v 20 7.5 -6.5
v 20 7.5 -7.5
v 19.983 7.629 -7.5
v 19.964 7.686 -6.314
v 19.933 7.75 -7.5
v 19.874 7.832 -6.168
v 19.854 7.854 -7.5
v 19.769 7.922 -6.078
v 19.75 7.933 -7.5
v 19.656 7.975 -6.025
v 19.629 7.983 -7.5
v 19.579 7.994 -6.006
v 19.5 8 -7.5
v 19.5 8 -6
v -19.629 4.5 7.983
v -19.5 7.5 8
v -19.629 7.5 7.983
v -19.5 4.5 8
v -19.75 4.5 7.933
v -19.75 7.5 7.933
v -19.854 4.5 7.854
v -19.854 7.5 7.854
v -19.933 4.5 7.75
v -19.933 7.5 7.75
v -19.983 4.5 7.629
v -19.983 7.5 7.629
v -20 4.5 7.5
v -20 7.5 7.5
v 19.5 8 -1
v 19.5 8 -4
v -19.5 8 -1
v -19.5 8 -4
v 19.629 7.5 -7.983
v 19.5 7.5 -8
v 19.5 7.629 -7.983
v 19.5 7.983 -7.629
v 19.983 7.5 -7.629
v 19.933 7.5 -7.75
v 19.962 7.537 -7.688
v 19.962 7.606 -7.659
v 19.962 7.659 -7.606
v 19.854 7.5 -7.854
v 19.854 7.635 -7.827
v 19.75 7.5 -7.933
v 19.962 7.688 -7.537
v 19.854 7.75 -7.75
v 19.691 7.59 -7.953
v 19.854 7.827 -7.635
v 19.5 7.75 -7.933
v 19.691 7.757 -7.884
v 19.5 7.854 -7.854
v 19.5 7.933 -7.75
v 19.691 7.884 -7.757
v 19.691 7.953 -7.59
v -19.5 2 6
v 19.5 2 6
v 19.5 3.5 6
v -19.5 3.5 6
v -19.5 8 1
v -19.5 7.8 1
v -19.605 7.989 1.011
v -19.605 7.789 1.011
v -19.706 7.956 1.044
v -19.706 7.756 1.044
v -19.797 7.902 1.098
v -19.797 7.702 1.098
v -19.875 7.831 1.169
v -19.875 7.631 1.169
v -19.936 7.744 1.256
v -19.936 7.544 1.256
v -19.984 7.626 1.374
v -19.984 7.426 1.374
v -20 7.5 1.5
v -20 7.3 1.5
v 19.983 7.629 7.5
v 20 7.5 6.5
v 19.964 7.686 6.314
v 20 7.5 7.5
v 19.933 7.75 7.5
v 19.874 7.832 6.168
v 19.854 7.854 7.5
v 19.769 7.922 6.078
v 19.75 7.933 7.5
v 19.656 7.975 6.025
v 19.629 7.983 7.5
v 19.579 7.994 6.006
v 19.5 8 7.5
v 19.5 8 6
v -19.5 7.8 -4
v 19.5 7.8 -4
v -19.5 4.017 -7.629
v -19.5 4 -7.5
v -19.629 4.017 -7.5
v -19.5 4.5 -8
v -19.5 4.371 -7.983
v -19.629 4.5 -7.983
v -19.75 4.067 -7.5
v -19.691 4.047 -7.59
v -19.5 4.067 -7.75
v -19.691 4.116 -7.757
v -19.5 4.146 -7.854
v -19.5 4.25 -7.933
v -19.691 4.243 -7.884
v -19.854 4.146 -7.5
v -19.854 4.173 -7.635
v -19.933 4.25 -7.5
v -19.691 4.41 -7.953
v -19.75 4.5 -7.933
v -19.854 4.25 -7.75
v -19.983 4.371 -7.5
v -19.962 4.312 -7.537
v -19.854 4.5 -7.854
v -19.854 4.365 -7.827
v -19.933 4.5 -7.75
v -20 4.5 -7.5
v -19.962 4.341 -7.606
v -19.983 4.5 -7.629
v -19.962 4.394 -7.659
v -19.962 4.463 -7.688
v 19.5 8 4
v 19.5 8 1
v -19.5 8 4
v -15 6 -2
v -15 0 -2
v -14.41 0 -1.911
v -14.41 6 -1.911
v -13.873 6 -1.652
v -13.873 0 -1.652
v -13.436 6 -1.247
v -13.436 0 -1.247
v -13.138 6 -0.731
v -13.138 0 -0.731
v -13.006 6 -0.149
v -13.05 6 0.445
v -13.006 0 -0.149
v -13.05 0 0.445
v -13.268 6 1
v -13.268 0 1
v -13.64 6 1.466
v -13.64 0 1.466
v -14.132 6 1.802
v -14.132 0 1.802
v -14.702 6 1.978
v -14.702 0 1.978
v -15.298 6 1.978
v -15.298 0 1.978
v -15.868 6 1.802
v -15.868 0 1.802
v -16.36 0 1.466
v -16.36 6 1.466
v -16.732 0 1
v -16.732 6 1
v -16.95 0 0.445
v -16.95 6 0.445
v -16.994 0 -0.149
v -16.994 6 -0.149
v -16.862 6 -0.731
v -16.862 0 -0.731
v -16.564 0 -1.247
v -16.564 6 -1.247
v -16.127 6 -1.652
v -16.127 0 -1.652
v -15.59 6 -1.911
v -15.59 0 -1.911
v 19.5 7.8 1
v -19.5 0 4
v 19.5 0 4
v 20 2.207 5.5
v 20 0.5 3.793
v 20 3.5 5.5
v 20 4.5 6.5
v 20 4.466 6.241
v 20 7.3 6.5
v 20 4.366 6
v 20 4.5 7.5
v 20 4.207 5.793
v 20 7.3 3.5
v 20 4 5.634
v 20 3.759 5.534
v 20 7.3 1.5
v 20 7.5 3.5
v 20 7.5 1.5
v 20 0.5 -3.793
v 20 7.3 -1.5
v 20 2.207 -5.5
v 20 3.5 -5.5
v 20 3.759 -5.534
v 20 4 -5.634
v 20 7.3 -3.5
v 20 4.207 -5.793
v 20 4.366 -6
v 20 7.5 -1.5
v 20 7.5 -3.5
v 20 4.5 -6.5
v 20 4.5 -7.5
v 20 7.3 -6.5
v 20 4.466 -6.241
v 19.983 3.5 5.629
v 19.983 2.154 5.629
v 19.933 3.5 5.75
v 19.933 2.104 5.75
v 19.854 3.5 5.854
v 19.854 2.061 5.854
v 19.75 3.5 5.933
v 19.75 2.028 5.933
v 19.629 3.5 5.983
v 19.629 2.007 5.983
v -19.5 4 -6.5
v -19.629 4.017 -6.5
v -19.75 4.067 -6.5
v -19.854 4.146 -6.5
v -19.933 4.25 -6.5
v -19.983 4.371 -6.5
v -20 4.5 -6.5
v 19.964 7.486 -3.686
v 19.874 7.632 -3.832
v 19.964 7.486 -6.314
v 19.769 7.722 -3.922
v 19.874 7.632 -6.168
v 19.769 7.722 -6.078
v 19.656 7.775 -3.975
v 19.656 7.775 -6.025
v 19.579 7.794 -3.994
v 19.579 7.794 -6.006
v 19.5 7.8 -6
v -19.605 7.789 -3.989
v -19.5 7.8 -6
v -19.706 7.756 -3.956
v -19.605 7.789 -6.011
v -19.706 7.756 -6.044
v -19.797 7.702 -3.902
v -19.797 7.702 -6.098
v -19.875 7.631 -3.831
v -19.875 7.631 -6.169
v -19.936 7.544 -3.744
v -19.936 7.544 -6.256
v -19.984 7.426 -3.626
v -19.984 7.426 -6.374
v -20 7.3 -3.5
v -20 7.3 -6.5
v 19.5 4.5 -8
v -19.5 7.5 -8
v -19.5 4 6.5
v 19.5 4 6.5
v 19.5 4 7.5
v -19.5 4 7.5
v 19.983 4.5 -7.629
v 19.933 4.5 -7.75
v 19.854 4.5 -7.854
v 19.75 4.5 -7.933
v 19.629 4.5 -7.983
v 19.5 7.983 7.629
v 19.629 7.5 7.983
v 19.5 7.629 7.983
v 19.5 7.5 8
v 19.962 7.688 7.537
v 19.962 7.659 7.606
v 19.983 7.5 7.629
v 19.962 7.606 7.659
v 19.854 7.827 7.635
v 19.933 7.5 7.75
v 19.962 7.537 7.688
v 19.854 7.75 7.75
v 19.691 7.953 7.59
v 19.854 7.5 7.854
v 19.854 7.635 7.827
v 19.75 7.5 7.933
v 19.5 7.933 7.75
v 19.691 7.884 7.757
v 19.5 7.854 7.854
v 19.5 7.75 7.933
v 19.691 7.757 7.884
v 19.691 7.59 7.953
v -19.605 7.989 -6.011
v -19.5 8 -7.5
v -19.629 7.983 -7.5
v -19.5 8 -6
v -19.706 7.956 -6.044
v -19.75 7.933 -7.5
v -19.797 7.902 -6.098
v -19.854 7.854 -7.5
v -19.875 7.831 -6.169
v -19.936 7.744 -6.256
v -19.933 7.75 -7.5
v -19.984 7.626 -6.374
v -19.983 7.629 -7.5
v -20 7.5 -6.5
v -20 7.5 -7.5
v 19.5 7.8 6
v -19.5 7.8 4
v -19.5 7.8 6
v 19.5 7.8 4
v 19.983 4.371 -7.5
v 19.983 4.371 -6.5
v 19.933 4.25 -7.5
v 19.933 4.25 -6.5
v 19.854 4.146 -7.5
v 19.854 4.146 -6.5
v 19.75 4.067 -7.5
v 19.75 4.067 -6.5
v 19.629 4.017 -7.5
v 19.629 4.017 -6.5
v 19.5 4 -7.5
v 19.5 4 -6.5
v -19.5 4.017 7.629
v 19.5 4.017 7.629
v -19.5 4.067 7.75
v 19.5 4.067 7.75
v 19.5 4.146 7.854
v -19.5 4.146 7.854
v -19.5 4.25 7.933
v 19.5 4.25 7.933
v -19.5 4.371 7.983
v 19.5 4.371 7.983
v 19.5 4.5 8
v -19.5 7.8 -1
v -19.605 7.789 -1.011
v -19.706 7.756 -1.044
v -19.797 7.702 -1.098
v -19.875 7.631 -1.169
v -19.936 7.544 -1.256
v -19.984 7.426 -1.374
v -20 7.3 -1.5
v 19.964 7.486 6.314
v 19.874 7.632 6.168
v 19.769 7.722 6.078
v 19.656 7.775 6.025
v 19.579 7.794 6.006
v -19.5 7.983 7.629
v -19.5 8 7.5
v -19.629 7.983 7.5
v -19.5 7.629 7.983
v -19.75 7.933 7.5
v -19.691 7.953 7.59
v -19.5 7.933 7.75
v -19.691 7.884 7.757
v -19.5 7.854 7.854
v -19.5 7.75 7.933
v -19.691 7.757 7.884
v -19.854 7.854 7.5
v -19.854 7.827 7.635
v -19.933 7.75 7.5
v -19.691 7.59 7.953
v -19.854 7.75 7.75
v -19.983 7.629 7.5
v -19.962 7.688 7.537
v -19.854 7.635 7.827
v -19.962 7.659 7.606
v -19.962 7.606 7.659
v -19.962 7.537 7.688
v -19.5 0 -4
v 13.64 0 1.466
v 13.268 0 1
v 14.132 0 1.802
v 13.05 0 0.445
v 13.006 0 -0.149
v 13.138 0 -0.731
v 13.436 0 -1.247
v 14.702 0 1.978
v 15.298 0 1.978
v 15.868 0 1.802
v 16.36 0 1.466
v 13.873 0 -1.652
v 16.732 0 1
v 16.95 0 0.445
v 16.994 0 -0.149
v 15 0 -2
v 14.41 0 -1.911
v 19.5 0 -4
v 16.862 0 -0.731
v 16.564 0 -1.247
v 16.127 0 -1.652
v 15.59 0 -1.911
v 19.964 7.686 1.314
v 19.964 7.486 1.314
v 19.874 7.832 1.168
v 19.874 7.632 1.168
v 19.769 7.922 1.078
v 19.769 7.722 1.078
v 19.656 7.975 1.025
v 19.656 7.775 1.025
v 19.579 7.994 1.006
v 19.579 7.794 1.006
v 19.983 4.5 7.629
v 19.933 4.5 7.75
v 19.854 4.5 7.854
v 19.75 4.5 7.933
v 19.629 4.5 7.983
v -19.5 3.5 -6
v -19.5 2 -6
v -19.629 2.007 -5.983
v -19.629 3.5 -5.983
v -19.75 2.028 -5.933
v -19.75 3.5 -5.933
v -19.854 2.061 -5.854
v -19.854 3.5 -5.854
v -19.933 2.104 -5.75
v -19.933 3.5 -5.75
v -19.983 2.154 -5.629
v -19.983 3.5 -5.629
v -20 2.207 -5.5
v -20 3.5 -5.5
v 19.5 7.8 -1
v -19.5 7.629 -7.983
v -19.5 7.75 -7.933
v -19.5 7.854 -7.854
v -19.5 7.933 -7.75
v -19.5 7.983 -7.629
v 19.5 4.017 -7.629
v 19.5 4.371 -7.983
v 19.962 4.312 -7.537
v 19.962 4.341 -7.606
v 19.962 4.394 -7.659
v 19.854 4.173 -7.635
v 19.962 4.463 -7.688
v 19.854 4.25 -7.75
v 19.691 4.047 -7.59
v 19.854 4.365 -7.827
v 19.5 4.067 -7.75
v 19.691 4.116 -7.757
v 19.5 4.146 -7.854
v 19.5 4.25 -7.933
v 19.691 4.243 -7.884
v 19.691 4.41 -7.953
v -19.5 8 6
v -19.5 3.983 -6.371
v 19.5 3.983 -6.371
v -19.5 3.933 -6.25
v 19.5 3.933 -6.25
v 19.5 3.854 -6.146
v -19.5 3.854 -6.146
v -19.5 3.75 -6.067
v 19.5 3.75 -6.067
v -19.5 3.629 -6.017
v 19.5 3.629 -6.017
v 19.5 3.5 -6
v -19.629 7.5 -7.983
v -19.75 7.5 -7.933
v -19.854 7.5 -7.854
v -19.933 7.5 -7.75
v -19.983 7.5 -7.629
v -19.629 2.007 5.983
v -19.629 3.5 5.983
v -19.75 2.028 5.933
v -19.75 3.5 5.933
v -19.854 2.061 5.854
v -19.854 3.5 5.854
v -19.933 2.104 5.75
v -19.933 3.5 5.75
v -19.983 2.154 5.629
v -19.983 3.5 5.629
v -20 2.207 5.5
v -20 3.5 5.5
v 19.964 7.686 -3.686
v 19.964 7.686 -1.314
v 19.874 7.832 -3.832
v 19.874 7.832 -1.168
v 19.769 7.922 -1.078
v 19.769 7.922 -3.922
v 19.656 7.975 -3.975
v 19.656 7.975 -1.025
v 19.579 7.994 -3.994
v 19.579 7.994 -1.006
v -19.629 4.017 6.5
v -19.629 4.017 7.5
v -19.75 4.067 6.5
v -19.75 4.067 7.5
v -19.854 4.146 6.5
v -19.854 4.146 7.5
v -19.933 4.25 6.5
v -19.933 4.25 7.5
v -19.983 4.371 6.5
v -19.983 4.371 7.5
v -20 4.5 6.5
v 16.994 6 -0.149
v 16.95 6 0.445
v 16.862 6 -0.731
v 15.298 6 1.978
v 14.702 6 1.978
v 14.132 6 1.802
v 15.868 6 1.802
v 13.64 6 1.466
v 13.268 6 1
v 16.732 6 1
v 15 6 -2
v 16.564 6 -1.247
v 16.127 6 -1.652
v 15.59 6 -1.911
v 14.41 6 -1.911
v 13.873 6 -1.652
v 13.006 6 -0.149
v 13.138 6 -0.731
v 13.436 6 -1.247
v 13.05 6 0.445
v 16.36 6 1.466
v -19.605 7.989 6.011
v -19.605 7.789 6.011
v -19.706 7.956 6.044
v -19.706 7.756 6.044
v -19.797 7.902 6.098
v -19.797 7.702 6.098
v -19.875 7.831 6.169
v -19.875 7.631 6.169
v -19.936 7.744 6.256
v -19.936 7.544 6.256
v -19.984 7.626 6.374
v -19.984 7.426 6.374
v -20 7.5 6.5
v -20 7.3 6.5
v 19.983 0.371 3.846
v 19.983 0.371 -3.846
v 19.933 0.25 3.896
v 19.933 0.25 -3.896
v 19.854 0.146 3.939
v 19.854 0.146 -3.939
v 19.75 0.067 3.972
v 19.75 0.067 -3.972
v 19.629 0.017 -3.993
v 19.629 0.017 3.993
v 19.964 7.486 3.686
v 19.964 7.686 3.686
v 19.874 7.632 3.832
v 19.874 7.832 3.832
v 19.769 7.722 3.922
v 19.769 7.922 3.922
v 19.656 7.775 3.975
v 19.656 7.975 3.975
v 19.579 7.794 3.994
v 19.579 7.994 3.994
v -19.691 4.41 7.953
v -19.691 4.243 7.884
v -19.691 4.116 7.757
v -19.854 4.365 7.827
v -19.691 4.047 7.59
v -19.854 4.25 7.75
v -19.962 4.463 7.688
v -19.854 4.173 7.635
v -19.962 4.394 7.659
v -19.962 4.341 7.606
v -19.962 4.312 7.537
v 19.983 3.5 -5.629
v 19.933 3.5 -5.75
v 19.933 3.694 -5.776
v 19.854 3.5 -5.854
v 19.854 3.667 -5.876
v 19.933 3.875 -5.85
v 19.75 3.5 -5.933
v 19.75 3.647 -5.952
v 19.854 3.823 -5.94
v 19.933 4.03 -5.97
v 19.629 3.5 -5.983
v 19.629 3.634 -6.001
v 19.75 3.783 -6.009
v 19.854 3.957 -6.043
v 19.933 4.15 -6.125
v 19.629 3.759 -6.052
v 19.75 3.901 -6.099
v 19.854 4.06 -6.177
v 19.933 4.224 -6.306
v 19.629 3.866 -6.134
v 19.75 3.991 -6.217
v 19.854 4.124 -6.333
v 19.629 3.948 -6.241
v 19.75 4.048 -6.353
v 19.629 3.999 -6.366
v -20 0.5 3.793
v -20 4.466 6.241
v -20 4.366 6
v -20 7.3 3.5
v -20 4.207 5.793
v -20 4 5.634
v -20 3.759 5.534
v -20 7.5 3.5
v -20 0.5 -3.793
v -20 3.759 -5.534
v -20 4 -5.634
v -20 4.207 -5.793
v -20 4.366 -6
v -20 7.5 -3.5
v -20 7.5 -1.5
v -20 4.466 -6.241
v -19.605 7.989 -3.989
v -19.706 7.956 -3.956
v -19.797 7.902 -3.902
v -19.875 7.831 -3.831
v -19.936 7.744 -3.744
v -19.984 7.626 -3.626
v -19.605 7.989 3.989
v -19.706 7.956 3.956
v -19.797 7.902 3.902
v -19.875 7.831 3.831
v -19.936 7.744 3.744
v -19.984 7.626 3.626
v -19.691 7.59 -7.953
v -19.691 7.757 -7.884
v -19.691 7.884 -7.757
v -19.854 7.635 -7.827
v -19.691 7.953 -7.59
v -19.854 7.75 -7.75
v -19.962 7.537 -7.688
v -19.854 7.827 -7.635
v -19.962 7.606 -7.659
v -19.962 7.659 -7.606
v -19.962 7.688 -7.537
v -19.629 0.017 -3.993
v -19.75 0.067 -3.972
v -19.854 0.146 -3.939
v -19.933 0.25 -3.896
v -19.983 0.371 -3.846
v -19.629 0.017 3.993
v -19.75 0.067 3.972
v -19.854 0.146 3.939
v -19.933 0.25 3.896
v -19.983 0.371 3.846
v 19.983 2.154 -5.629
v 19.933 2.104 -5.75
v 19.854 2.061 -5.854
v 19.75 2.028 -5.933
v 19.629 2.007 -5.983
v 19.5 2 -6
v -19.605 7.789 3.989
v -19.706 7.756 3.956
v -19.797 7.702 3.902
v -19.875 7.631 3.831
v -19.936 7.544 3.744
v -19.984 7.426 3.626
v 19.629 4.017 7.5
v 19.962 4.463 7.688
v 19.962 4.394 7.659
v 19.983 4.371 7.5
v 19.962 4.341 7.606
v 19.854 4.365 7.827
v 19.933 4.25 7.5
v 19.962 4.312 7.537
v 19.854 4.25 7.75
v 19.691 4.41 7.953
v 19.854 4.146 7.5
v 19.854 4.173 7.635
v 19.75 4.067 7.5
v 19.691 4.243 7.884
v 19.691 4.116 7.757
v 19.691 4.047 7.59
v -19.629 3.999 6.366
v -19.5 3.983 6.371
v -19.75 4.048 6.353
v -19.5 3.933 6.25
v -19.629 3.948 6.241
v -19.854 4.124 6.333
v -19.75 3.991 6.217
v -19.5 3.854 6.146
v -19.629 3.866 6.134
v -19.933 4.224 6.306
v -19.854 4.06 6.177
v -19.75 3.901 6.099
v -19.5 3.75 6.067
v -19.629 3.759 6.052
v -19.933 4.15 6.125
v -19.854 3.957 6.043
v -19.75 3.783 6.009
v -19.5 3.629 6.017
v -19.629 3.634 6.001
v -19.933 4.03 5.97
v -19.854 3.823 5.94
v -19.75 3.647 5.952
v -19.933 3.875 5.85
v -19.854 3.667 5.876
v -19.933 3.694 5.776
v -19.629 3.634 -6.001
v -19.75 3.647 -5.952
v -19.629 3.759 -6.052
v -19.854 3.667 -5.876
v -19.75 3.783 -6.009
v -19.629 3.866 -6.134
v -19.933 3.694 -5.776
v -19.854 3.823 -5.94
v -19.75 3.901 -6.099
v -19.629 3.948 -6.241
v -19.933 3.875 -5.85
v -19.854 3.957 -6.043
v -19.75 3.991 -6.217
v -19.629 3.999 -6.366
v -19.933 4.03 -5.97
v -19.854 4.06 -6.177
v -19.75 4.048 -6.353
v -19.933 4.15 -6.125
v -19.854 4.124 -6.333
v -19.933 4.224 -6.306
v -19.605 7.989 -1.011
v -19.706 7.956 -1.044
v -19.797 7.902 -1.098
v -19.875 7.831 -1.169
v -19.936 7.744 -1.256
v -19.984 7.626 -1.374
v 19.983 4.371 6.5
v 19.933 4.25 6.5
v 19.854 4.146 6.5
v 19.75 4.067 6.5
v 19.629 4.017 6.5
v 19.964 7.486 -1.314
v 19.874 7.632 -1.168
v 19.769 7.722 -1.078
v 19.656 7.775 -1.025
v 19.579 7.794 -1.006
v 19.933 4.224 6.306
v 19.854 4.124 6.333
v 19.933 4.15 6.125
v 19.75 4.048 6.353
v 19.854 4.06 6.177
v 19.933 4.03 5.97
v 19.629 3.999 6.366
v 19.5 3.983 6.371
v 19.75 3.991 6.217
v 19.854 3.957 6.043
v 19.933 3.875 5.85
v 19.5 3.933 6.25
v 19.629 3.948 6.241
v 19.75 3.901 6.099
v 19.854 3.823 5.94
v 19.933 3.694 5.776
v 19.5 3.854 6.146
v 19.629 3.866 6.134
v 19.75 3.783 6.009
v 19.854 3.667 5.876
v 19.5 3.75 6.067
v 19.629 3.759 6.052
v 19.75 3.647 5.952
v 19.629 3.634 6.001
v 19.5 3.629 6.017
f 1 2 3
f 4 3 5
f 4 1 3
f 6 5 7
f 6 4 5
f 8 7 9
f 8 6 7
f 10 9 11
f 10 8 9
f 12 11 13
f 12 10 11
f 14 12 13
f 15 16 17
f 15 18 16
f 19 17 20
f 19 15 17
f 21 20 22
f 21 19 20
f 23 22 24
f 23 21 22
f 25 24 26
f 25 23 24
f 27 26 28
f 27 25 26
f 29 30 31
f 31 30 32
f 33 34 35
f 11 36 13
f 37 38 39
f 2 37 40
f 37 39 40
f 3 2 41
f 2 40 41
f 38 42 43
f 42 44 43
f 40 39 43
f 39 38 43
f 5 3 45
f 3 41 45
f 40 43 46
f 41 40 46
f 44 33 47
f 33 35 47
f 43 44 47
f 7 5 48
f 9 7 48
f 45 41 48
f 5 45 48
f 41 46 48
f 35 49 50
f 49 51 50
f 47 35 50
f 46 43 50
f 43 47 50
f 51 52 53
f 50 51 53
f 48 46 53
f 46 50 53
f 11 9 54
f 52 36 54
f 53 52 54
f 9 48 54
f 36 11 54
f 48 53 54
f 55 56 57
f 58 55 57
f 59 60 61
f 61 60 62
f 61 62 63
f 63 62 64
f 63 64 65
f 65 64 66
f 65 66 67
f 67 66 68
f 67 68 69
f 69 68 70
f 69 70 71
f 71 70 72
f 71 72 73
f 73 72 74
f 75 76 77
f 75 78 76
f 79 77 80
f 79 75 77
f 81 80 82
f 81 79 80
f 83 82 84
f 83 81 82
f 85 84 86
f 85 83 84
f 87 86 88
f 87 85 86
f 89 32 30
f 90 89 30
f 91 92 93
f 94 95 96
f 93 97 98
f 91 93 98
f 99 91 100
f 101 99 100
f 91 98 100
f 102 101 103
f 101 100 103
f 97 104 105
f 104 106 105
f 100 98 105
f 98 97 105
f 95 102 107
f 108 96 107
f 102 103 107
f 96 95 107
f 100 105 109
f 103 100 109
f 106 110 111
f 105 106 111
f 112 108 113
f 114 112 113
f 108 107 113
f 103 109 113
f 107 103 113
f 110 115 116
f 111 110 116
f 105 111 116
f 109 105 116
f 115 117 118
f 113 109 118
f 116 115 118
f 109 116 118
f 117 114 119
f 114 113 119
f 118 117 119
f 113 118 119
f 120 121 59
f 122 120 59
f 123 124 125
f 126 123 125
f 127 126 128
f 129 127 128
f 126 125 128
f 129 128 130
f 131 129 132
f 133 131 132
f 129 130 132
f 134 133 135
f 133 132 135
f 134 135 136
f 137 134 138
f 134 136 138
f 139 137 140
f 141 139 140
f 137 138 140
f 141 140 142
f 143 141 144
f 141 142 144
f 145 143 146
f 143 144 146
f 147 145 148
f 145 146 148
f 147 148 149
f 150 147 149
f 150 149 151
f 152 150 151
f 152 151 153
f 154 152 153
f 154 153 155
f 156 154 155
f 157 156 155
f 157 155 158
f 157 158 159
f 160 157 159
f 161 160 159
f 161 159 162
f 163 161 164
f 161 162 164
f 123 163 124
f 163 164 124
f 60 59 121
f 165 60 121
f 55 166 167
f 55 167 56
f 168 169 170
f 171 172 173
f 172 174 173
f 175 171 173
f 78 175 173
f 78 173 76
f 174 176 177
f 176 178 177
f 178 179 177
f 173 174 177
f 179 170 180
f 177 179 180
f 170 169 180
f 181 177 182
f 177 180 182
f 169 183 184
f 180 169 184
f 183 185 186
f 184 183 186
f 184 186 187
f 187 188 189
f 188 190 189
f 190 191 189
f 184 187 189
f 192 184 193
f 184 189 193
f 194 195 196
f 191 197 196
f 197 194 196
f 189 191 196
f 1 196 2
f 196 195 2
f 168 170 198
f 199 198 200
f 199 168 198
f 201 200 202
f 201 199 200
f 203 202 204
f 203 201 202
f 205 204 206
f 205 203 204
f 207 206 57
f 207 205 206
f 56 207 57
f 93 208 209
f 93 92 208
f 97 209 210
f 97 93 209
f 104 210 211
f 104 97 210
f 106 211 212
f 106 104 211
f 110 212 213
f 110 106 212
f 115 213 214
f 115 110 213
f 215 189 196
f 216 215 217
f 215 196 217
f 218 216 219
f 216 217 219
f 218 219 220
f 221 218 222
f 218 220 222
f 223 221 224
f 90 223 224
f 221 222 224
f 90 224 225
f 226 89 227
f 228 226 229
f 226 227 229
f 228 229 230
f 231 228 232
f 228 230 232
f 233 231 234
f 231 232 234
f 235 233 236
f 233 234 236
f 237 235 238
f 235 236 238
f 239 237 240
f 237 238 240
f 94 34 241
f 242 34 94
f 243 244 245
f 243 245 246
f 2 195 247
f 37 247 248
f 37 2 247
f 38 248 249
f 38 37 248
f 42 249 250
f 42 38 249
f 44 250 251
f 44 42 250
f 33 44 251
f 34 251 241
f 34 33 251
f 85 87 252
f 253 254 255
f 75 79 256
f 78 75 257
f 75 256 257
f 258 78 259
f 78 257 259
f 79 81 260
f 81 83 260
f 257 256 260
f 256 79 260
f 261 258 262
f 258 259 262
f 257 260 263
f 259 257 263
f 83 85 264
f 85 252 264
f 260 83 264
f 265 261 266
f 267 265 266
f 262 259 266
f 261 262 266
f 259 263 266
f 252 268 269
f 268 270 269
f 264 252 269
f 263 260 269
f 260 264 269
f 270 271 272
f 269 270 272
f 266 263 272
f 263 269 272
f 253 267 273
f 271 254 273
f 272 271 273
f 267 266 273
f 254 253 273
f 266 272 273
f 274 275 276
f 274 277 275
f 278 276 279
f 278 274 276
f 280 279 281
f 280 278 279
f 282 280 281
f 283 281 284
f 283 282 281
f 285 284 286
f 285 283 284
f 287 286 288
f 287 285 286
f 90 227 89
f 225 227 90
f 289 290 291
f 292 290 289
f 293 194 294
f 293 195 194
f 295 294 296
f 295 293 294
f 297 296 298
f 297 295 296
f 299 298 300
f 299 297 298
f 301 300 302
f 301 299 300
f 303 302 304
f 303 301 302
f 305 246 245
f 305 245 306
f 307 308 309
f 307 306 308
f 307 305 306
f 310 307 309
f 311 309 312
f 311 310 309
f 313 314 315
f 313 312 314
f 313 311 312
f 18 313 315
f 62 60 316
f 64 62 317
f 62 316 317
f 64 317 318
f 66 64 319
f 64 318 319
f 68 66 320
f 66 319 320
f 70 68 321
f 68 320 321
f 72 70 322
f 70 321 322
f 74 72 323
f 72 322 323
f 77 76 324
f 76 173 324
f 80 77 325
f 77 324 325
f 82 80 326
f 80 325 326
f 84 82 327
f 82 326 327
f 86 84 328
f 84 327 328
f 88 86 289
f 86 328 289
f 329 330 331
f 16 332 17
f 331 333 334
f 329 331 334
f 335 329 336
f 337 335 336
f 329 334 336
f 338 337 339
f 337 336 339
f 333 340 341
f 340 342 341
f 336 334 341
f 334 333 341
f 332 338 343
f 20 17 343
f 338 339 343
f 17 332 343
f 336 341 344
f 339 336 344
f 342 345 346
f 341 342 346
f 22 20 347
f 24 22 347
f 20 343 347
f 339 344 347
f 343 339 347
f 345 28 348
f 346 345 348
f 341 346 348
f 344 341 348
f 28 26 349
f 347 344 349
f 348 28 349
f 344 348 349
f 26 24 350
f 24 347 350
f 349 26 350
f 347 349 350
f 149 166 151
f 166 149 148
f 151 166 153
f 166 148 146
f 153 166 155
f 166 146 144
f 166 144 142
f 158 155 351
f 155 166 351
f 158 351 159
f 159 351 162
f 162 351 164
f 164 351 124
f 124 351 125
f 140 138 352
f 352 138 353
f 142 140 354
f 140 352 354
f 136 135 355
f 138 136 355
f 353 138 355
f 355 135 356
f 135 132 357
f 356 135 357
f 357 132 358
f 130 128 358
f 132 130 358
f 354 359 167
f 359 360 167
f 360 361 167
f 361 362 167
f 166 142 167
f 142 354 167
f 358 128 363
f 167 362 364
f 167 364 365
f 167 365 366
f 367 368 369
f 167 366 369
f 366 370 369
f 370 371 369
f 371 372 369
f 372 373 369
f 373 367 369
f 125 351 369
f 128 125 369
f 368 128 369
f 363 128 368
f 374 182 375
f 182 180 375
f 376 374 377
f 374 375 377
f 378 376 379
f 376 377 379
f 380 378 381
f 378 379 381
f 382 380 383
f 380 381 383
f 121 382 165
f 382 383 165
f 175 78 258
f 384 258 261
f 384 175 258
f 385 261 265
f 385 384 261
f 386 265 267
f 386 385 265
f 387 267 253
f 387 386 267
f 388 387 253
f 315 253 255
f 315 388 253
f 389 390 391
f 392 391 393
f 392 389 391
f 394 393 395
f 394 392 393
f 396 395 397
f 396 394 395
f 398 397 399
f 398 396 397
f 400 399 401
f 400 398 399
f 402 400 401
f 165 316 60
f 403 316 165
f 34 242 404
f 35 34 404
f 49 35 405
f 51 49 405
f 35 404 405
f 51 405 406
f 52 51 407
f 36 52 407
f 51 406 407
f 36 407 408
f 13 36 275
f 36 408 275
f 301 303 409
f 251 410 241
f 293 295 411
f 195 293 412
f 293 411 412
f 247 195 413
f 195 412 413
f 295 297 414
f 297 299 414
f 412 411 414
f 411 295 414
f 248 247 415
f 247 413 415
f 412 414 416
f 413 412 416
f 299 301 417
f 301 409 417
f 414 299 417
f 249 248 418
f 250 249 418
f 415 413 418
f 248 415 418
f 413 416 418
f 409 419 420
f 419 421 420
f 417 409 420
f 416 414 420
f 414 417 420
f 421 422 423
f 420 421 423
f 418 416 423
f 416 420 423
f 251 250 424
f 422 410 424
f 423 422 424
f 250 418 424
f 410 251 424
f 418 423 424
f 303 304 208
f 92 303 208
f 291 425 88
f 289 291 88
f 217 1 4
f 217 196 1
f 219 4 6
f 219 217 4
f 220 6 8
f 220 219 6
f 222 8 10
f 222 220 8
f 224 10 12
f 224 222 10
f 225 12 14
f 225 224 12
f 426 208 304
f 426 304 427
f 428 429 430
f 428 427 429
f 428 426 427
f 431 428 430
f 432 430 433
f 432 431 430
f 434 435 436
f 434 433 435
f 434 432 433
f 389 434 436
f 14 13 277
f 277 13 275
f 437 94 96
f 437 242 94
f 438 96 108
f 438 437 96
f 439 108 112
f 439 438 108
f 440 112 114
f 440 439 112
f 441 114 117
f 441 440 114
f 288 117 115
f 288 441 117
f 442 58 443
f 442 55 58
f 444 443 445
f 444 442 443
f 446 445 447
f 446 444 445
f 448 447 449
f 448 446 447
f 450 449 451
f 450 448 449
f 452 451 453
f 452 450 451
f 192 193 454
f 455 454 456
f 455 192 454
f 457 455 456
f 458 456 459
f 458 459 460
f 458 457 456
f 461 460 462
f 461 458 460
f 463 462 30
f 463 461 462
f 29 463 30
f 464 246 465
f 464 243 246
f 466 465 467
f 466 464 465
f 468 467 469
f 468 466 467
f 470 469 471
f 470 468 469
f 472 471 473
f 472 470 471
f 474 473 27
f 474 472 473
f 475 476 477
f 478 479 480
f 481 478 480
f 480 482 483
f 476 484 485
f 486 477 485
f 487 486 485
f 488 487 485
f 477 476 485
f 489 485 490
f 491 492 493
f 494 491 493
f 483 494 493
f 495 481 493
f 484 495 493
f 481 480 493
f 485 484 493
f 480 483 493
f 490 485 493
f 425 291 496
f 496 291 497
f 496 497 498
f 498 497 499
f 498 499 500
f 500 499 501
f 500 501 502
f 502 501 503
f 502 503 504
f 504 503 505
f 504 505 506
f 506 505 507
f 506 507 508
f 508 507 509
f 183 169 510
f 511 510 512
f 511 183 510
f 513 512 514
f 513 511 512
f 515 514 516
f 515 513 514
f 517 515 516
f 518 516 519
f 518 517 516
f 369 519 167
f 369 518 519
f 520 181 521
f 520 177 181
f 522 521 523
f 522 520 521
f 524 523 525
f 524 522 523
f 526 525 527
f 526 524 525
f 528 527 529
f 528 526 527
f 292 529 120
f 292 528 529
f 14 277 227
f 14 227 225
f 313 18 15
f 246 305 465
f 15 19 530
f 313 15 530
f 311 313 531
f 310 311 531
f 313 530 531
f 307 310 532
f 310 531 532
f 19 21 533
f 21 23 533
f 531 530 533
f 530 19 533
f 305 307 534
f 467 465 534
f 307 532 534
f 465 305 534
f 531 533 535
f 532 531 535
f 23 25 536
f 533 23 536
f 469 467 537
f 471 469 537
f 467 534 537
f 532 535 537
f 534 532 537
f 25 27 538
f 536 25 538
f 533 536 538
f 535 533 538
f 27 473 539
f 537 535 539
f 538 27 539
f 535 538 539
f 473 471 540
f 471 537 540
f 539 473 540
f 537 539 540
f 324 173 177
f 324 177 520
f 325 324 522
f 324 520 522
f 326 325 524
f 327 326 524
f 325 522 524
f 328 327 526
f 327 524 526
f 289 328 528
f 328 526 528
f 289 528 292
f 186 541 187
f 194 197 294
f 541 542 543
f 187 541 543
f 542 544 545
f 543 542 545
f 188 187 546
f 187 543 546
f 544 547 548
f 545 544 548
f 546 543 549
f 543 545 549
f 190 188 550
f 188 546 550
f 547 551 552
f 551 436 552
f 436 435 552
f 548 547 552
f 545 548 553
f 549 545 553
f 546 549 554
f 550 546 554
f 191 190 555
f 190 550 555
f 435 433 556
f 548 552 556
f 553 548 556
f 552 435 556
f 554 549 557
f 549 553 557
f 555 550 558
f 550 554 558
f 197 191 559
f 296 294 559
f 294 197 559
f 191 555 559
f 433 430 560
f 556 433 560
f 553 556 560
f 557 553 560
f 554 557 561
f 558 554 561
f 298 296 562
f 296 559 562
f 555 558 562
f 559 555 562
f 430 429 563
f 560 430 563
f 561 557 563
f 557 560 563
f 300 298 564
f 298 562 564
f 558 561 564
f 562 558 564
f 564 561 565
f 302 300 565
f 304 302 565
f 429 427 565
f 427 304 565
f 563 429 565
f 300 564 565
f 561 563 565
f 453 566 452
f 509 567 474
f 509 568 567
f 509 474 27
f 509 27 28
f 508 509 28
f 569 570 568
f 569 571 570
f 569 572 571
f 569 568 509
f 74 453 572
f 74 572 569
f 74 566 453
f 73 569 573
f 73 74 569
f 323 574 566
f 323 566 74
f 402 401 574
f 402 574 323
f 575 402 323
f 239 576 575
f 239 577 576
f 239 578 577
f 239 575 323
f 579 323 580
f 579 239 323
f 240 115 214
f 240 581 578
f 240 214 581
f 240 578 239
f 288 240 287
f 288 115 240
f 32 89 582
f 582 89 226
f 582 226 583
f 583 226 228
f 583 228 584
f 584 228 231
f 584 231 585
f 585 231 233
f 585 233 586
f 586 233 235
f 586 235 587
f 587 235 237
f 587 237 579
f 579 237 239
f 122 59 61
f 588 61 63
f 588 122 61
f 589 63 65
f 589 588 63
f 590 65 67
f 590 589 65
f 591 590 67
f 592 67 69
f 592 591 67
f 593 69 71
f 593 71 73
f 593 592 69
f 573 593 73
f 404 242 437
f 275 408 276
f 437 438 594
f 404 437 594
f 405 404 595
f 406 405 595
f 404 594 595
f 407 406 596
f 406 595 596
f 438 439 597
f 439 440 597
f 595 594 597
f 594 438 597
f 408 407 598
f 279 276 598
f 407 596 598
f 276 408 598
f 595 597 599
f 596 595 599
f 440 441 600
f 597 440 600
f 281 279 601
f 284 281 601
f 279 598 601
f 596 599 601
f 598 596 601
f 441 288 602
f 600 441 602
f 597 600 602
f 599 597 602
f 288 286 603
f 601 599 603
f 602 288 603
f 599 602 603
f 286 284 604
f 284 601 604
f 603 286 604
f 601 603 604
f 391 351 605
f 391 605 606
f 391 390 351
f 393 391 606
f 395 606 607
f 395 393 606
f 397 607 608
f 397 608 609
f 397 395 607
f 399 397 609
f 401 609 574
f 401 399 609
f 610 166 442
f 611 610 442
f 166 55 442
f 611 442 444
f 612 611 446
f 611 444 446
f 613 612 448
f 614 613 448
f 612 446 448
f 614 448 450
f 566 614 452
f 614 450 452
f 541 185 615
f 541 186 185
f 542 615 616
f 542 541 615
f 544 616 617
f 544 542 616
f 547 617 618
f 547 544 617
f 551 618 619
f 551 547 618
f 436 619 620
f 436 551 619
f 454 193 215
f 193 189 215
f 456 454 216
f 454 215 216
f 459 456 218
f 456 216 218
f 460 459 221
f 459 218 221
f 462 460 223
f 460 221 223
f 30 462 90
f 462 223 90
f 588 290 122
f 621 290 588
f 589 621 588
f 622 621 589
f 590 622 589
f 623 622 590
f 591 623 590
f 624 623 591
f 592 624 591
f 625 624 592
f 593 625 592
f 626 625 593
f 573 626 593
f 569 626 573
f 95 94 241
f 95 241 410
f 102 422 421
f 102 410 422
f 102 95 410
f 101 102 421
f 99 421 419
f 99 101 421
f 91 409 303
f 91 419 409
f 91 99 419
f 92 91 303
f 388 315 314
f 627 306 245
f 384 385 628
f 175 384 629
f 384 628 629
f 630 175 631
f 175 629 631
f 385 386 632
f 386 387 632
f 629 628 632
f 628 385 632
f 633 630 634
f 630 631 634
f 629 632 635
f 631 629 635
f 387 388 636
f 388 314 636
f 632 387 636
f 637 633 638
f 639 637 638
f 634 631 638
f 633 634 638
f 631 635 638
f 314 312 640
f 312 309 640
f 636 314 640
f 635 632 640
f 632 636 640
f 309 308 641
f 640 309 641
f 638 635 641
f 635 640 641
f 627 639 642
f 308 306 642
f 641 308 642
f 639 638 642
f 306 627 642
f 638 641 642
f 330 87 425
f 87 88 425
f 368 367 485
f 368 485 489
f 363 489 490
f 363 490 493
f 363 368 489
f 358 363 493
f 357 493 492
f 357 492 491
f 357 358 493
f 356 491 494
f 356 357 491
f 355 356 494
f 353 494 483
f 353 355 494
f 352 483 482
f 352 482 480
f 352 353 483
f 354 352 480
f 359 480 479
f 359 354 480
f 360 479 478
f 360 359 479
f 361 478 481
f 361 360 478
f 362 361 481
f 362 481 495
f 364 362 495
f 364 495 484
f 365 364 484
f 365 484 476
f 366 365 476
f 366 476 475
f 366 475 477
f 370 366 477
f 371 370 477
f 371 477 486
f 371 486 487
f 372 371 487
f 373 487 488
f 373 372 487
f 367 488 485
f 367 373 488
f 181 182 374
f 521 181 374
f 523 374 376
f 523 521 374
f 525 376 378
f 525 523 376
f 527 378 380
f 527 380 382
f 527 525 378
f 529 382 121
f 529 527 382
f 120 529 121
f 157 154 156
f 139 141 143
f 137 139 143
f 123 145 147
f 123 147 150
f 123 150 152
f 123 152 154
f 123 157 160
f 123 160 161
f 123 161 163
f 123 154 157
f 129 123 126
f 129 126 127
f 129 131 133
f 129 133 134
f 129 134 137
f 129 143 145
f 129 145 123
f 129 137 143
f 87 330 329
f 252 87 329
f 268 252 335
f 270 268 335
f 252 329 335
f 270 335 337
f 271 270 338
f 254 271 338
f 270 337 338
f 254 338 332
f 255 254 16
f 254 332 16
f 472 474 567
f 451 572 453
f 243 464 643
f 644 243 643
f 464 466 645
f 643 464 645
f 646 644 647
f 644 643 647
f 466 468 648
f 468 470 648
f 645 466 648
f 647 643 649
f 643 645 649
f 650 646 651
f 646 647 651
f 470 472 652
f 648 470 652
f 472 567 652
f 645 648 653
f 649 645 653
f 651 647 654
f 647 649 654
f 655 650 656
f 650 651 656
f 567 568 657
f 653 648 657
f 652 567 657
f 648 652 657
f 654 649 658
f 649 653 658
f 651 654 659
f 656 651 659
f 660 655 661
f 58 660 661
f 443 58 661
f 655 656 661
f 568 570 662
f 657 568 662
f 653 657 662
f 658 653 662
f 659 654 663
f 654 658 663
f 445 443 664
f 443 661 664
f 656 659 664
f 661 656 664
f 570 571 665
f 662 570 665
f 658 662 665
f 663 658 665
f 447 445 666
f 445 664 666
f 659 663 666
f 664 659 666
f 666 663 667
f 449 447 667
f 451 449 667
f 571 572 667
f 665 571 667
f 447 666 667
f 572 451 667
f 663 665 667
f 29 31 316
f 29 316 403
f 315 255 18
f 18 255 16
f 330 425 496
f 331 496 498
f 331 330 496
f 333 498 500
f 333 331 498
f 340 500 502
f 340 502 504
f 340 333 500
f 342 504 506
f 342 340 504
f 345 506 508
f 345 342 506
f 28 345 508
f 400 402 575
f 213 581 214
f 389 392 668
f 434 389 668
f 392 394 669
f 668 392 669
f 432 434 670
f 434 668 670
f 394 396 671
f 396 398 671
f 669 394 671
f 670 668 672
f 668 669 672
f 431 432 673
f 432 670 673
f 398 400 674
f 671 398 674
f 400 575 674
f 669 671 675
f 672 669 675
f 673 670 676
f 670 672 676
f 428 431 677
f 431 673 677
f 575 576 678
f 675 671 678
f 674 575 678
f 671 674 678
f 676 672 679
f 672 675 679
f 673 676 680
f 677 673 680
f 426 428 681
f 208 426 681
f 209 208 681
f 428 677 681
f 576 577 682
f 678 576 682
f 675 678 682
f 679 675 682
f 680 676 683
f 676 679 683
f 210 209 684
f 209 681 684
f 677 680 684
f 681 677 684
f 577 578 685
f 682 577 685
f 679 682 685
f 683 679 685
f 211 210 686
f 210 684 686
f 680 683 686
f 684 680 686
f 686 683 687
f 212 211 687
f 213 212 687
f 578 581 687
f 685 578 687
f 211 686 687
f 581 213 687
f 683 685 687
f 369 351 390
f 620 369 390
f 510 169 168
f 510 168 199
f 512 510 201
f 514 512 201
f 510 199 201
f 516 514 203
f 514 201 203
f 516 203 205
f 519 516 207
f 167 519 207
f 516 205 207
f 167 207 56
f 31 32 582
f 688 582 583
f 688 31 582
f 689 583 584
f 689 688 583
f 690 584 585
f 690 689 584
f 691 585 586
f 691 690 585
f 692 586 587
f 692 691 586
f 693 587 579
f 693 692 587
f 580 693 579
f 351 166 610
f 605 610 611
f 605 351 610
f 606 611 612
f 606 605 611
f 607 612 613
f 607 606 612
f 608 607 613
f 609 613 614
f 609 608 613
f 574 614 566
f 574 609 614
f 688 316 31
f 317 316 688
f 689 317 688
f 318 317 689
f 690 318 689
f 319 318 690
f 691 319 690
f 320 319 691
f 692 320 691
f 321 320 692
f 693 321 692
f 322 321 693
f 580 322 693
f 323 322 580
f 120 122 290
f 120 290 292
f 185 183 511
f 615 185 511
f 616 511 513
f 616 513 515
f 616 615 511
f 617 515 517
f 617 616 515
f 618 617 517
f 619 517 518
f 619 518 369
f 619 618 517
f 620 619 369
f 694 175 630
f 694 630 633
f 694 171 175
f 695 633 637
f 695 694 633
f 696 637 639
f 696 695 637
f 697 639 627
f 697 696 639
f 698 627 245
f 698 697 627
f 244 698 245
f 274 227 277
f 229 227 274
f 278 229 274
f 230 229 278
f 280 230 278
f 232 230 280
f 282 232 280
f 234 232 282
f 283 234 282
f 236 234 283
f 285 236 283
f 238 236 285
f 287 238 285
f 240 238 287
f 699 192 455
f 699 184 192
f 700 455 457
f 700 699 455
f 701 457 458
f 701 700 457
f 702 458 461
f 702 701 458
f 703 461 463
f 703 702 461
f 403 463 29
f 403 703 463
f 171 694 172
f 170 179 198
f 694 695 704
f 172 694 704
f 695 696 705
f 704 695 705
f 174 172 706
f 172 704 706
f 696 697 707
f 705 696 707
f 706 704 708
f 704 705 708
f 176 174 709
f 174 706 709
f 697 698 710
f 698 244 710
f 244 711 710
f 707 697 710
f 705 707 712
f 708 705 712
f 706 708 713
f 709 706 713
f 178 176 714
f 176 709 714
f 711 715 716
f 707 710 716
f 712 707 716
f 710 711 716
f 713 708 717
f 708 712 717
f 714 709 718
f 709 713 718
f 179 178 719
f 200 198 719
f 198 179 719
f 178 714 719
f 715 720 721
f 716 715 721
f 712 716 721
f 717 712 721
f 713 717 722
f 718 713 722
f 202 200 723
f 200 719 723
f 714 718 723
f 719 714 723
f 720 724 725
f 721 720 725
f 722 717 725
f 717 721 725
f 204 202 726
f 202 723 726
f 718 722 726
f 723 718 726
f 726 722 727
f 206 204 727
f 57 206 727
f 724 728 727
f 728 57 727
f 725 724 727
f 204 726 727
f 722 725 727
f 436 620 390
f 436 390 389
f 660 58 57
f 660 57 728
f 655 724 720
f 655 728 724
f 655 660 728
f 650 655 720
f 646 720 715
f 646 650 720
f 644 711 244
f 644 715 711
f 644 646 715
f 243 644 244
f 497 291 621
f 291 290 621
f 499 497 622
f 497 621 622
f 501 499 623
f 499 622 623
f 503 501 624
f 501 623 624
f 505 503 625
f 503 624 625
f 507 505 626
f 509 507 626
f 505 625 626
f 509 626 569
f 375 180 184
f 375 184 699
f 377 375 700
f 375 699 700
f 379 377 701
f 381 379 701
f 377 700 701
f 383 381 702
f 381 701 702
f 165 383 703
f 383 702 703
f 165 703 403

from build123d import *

# Parameters (mm, degrees)
ESQUISSE1_W             = 40
ESQUISSE1_H             = 8
BOSS_EXTRU_1_DEPTH      = 8
BOSS_EXTRU_3_DEPTH      = 40
ESQUISSE6_W             = 40
ESQUISSE6_H             = 4
BOSS_EXTRU_4_DEPTH      = 2
ESQUISSE7_R             = 2
ENL_V_MAT_EXTRU_1_DEPTH = 6
ESQUISSE10_W            = 40
ESQUISSE10_H            = 2
ENL_V_MAT_EXTRU_4_DEPTH = 0.2
CONG_2_R                = 0.5
CONG_3_R                = 0.5
CONG_4_R                = 0.5


with BuildPart() as part:
    # Esquisse1 → Boss.-Extru.1 (new body)
    with BuildSketch(Plane(origin=(0, 0, 0), x_dir=(1, 0, 0), z_dir=(0, 1, 0))):
        Rectangle(ESQUISSE1_W, ESQUISSE1_H)
    extrude(amount=BOSS_EXTRU_1_DEPTH)

    # Esquisse5 → Boss.-Extru.3 (add)
    with BuildSketch(Plane.ZY.offset(20)):
        Polygon((-4, 0), (-6, 2), (-6, 8), (-4, 8), align=None)
    boss_extru_3 = extrude(amount=-BOSS_EXTRU_3_DEPTH)

    # Symétrie2: Boss.-Extru.3 across plane
    add(boss_extru_3.mirror(Plane(origin=(0, 0, 0), x_dir=(1, 0, 0), z_dir=(0, 0, -1))))

    # Esquisse6 → Boss.-Extru.4 (add)
    with BuildSketch(Plane(origin=(0, 0, -6), x_dir=(-1, 0, 0), z_dir=(0, 0, -1))):
        with Locations((0, 6)):
            Rectangle(ESQUISSE6_W, ESQUISSE6_H)
    boss_extru_4 = extrude(amount=BOSS_EXTRU_4_DEPTH)

    # Symétrie4: Boss.-Extru.4 across plane
    add(boss_extru_4.mirror(Plane(origin=(0, 0, 0), x_dir=(1, 0, 0), z_dir=(0, 0, -1))))

    # Esquisse7 → Enlèv. mat.-Extru.1 (cut)
    with BuildSketch(Plane.XZ):
        with Locations(Location((-15, 0, 0), (0, 0, 270))):
            Circle(ESQUISSE7_R)
    enl_v_mat_extru_1 = extrude(amount=-ENL_V_MAT_EXTRU_1_DEPTH, mode=Mode.SUBTRACT)

    # Symétrie10: Enlèv. mat.-Extru.1 across plane
    add(enl_v_mat_extru_1.mirror(Plane(origin=(0, 0, 0), x_dir=(0, 0, 1), z_dir=(1, 0, 0))), mode=Mode.SUBTRACT)

    # Esquisse10 → Enlèv. mat.-Extru.4 (cut)
    with BuildSketch(Plane(origin=(0, 8, 0), x_dir=(1, 0, 0), z_dir=(0, 1, 0))):
        Rectangle(ESQUISSE10_W, ESQUISSE10_H)
        with Locations((0, 5)):
            Rectangle(ESQUISSE10_W, ESQUISSE10_H)
        with Locations((0, -5)):
            Rectangle(ESQUISSE10_W, ESQUISSE10_H)
    extrude(amount=-ENL_V_MAT_EXTRU_4_DEPTH, mode=Mode.SUBTRACT)

    # Congé2
    cong_2_edges = [part.edges().sort_by_distance(p)[0] for p in [
        (0, 8, -8),
        (0, 8, 8),
    ]]
    fillet(cong_2_edges, radius=CONG_2_R)

    # Congé3
    cong_3_edges = [part.edges().sort_by_distance(p)[0] for p in [
        (0, 4, -6),
        (0, 4, -8),
        (0, 4, 8),
        (0, 4, 6),
    ]]
    fillet(cong_3_edges, radius=CONG_3_R)

    # Congé4
    cong_4_edges = [part.edges().sort_by_distance(p)[0] for p in [
        (-20, 7.8, -5),
        (-20, 7.9, -4),
        (-20, 7.9, -6),
        (20, 7.8, -5),
        (20, 7.9, -6),
        (20, 7.9, -4),
        (-20, 7.8, 5),
        (-20, 7.9, 6),
        (-20, 7.9, 4),
        (20, 7.8, 5),
        (20, 7.9, 4),
        (20, 7.9, 6),
        (20, 8, 6.75),
        (20, 6, 8),
        (20, 6, -8),
        (20, 7.853553391, -7.853553391),
        (20, 7.853553391, 7.853553391),
        (-20, 8, -6.75),
        (-20, 7.853553391, -7.853553391),
        (-20, 7.853553391, 7.853553391),
        (20, 2.75, 6),
        (-20, 2.75, 6),
        (20, 4, 7),
        (-20, 4, 7),
        (20, 1, -5),
        (-20, 6, 8),
        (-20, 6, -8),
        (-20, 4, -7),
        (-20, 2.75, -6),
        (-20, 4.146446609, -7.853553391),
        (-20, 4.146446609, 7.853553391),
        (20, 2.75, -6),
        (20, 4, -7),
        (20, 4.146446609, -7.853553391),
        (20, 4.146446609, 7.853553391),
        (-20, 3.853553391, 6.146446609),
        (20, 3.853553391, 6.146446609),
        (-20, 3.853553391, -6.146446609),
        (20, 3.853553391, -6.146446609),
        (-20, 1, -5),
        (-20, 1, 5),
        (20, 1, 5),
        (-20, 0, 0),
        (20, 0, 0),
        (20, 8, -2.5),
        (-20, 8, 2.5),
        (-20, 7.8, 0),
        (-20, 7.9, 1),
        (-20, 7.9, -1),
        (20, 7.8, 0),
        (20, 7.9, -1),
        (20, 7.9, 1),
        (-20, 8, 6.75),
        (20, 8, 2.5),
        (-20, 8, -2.5),
        (20, 8, -6.75),
    ]]
    fillet(cong_4_edges, radius=CONG_4_R)


solid = part.part
